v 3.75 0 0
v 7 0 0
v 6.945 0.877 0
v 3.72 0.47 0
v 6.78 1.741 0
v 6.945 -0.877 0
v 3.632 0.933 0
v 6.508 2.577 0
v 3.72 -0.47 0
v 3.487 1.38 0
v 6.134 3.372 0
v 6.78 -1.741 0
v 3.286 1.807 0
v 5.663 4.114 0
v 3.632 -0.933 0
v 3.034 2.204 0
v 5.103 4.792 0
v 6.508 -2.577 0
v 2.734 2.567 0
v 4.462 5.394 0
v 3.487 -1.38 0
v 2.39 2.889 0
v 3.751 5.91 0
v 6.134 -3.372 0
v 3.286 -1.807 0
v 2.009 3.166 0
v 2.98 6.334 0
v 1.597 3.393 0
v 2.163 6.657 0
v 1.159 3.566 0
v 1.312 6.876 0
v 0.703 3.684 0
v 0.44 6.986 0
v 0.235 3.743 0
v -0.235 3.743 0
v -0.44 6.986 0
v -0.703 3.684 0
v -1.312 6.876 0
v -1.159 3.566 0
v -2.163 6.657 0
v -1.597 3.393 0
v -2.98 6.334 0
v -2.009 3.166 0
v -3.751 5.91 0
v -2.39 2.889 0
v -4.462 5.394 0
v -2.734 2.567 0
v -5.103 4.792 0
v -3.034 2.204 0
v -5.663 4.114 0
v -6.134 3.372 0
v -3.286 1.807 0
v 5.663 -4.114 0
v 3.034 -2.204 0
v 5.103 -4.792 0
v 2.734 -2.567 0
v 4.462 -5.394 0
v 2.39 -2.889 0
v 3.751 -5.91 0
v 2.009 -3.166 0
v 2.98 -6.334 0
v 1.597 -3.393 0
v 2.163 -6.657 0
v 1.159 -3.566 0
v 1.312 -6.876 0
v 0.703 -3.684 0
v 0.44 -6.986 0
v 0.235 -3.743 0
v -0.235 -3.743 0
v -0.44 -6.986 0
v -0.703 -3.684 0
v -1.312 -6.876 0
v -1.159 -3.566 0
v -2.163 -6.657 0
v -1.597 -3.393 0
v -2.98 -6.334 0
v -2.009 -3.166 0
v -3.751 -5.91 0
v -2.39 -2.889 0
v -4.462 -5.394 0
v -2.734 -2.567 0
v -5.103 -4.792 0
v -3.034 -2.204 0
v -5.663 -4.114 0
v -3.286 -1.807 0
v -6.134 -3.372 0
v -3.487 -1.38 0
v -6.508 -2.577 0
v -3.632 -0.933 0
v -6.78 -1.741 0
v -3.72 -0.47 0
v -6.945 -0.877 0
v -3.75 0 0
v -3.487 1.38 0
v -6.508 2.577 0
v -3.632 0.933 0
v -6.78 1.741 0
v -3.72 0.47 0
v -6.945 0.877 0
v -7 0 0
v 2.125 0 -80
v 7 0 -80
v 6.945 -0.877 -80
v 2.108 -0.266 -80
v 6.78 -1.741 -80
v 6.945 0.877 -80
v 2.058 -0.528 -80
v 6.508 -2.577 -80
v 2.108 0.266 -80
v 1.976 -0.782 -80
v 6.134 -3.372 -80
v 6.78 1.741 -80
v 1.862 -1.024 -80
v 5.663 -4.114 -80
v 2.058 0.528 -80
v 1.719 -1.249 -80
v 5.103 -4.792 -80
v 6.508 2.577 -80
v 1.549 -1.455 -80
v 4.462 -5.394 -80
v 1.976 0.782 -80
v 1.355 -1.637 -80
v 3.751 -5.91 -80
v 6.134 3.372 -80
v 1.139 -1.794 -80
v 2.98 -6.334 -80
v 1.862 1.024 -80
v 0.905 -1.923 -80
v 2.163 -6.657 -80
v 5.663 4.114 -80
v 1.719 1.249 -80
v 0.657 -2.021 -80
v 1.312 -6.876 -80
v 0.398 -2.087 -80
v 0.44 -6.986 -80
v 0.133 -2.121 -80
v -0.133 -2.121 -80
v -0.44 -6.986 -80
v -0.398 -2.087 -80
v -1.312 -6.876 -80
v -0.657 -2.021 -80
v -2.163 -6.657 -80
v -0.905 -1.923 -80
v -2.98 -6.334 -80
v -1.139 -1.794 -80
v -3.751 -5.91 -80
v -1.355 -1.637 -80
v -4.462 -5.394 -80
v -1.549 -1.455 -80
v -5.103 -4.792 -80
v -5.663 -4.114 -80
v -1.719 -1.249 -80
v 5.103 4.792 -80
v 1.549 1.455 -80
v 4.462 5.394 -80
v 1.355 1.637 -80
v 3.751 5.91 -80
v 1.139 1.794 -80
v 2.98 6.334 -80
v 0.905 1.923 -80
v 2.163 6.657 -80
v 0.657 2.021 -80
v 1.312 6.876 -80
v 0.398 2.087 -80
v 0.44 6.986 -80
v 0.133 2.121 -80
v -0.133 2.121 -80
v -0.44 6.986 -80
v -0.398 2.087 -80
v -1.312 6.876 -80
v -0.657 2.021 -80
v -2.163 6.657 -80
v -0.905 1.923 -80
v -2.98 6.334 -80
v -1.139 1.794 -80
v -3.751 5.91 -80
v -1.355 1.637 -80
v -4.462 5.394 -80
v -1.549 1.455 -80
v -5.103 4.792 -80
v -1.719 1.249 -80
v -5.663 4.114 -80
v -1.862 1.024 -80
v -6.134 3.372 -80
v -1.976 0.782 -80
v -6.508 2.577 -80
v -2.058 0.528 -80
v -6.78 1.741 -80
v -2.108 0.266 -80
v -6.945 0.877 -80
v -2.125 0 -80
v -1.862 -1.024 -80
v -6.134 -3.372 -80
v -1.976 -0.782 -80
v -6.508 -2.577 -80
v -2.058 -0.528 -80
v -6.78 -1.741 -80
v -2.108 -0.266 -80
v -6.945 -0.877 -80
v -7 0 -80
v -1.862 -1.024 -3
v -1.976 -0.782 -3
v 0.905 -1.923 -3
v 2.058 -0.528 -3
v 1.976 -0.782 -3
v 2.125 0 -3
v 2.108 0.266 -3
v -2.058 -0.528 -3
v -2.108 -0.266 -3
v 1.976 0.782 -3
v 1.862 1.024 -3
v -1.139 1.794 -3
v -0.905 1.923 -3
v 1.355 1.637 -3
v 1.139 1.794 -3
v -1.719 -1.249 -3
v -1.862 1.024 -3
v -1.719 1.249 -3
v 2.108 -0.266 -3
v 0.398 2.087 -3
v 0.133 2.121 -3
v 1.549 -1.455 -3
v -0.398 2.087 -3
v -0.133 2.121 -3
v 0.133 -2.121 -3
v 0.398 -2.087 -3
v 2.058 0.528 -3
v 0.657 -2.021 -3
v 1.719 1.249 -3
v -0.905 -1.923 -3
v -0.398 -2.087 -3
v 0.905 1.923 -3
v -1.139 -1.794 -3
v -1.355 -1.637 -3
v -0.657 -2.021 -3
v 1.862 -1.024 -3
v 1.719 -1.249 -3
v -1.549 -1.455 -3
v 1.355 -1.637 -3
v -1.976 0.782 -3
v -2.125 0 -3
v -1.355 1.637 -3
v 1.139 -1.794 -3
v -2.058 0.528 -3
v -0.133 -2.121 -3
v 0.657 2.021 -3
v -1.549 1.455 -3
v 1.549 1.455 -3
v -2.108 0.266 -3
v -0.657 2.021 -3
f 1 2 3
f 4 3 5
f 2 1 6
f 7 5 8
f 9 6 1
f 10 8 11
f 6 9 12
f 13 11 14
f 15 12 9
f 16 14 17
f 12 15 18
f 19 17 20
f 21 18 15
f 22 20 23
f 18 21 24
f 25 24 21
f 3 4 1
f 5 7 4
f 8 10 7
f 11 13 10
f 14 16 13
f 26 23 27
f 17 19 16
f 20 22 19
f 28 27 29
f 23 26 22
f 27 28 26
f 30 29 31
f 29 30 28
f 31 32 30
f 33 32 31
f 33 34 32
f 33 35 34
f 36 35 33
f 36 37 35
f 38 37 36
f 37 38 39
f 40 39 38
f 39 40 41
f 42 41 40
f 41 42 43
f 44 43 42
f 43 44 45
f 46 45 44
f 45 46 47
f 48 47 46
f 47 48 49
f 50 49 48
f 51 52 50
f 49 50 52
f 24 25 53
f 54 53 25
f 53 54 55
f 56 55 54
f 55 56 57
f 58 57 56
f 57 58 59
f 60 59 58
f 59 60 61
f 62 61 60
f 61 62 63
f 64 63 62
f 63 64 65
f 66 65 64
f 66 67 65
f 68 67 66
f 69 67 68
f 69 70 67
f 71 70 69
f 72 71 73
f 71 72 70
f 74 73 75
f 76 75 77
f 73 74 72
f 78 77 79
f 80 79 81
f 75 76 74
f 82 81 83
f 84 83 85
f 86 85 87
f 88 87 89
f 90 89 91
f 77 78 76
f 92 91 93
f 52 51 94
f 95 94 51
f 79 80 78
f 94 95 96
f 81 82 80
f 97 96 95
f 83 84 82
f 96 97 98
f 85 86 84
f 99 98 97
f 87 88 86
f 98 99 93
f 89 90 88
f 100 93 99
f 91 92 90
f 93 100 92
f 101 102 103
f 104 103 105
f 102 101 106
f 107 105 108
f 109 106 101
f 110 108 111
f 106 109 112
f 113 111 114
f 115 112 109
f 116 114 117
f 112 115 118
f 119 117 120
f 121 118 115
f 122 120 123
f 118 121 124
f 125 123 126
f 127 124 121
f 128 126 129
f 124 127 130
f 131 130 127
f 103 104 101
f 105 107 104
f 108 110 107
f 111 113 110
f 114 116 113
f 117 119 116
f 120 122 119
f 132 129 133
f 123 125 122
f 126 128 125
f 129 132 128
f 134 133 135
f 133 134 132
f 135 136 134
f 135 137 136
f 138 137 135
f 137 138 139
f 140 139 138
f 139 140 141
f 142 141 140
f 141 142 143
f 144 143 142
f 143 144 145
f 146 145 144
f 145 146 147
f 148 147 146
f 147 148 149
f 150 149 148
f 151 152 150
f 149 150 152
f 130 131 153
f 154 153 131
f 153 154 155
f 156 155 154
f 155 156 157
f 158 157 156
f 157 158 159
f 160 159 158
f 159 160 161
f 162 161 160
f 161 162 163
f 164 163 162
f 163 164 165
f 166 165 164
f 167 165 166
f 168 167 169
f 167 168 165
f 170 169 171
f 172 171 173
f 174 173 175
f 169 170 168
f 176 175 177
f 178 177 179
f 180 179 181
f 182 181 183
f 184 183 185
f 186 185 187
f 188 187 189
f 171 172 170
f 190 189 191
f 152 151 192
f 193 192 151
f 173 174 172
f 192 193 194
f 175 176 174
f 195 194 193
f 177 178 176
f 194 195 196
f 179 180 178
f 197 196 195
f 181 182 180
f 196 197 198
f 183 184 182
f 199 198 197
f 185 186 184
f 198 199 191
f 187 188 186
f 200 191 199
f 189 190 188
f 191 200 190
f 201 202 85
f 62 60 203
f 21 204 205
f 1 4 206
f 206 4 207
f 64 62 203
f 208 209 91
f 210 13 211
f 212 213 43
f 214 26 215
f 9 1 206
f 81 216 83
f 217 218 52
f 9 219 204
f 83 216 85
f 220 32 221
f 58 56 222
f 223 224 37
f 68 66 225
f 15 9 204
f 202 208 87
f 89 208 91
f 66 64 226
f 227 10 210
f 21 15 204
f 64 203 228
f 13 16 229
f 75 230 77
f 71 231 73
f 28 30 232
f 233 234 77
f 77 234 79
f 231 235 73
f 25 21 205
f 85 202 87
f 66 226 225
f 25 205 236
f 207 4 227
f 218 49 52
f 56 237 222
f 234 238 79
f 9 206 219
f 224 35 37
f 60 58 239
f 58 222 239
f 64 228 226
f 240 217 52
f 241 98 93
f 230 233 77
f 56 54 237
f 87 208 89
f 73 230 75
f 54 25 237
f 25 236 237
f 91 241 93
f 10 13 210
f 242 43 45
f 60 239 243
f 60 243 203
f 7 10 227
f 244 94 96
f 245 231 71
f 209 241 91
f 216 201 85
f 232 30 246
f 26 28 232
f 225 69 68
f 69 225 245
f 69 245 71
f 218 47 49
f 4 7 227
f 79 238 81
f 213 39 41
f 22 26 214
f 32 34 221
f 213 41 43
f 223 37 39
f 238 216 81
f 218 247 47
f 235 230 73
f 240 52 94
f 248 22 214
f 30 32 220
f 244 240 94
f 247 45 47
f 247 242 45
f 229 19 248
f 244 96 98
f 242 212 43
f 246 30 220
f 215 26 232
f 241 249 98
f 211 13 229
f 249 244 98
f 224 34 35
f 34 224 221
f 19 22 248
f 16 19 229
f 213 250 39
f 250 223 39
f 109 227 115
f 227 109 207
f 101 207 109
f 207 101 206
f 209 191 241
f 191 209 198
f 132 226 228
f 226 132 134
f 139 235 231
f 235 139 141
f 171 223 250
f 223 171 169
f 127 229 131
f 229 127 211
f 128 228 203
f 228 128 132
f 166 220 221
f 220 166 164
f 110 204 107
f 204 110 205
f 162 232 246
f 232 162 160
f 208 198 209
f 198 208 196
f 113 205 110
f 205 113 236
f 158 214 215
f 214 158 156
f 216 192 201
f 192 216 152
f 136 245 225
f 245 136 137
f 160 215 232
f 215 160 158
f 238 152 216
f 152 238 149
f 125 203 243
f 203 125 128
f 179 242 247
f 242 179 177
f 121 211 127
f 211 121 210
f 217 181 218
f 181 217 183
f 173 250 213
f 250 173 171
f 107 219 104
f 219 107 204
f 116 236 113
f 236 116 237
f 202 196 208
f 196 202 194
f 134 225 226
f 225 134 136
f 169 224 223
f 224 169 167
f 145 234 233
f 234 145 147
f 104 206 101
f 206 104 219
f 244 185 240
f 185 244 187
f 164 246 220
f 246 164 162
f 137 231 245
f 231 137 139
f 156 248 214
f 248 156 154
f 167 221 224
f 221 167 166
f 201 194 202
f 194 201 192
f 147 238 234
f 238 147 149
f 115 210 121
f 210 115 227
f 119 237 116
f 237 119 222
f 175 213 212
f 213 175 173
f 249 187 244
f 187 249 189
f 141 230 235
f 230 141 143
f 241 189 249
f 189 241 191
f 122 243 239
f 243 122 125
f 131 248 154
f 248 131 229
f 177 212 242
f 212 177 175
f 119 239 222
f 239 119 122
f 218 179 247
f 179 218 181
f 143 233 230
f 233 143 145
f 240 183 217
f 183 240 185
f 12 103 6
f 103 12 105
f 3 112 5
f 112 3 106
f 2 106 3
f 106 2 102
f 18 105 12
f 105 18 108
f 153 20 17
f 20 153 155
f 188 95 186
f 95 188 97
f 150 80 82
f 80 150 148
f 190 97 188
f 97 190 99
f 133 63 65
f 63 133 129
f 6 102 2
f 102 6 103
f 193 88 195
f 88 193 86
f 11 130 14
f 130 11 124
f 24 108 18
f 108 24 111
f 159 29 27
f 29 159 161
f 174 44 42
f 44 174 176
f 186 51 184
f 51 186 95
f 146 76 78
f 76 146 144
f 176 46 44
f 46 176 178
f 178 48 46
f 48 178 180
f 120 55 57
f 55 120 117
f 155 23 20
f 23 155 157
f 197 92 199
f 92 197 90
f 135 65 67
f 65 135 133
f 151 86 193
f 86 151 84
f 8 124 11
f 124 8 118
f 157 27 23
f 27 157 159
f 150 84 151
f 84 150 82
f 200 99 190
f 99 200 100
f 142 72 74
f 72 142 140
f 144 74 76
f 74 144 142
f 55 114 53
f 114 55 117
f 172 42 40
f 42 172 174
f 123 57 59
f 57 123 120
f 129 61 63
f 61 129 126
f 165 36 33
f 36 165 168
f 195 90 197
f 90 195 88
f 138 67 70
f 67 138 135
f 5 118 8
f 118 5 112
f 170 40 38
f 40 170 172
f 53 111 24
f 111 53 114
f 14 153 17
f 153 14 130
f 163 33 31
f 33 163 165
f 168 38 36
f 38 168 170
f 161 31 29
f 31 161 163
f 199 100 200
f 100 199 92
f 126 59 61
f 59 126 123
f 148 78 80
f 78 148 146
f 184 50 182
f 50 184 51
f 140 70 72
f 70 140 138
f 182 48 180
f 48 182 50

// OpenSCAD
$fn = 50;


difference() {
	union() {
		translate(v = [0, 0, -80.0000000000]) {
			cylinder(h = 80, r = 7.0000000000);
		}
		cylinder(h = 0, r = 10.0000000000);
	}
	union() {
		translate(v = [0, 0, 0]) {
			rotate(a = [0, 0, 0]) {
				difference() {
					union() {
						#translate(v = [0, 0, -80.0000000000]) {
							cylinder(h = 80, r = 2.0000000000);
						}
						#translate(v = [0, 0, -3]) {
							cylinder(h = 3, r = 7.0000000000, r1 = 2.1250000000, r2 = 3.7500000000);
						}
						#translate(v = [0, 0, -80.0000000000]) {
							cylinder(h = 80, r = 2.1250000000);
						}
						#translate(v = [0, 0, -80.0000000000]) {
							cylinder(h = 80, r = 2.0000000000);
						}
					}
					union();
				}
			}
		}
	}
}
